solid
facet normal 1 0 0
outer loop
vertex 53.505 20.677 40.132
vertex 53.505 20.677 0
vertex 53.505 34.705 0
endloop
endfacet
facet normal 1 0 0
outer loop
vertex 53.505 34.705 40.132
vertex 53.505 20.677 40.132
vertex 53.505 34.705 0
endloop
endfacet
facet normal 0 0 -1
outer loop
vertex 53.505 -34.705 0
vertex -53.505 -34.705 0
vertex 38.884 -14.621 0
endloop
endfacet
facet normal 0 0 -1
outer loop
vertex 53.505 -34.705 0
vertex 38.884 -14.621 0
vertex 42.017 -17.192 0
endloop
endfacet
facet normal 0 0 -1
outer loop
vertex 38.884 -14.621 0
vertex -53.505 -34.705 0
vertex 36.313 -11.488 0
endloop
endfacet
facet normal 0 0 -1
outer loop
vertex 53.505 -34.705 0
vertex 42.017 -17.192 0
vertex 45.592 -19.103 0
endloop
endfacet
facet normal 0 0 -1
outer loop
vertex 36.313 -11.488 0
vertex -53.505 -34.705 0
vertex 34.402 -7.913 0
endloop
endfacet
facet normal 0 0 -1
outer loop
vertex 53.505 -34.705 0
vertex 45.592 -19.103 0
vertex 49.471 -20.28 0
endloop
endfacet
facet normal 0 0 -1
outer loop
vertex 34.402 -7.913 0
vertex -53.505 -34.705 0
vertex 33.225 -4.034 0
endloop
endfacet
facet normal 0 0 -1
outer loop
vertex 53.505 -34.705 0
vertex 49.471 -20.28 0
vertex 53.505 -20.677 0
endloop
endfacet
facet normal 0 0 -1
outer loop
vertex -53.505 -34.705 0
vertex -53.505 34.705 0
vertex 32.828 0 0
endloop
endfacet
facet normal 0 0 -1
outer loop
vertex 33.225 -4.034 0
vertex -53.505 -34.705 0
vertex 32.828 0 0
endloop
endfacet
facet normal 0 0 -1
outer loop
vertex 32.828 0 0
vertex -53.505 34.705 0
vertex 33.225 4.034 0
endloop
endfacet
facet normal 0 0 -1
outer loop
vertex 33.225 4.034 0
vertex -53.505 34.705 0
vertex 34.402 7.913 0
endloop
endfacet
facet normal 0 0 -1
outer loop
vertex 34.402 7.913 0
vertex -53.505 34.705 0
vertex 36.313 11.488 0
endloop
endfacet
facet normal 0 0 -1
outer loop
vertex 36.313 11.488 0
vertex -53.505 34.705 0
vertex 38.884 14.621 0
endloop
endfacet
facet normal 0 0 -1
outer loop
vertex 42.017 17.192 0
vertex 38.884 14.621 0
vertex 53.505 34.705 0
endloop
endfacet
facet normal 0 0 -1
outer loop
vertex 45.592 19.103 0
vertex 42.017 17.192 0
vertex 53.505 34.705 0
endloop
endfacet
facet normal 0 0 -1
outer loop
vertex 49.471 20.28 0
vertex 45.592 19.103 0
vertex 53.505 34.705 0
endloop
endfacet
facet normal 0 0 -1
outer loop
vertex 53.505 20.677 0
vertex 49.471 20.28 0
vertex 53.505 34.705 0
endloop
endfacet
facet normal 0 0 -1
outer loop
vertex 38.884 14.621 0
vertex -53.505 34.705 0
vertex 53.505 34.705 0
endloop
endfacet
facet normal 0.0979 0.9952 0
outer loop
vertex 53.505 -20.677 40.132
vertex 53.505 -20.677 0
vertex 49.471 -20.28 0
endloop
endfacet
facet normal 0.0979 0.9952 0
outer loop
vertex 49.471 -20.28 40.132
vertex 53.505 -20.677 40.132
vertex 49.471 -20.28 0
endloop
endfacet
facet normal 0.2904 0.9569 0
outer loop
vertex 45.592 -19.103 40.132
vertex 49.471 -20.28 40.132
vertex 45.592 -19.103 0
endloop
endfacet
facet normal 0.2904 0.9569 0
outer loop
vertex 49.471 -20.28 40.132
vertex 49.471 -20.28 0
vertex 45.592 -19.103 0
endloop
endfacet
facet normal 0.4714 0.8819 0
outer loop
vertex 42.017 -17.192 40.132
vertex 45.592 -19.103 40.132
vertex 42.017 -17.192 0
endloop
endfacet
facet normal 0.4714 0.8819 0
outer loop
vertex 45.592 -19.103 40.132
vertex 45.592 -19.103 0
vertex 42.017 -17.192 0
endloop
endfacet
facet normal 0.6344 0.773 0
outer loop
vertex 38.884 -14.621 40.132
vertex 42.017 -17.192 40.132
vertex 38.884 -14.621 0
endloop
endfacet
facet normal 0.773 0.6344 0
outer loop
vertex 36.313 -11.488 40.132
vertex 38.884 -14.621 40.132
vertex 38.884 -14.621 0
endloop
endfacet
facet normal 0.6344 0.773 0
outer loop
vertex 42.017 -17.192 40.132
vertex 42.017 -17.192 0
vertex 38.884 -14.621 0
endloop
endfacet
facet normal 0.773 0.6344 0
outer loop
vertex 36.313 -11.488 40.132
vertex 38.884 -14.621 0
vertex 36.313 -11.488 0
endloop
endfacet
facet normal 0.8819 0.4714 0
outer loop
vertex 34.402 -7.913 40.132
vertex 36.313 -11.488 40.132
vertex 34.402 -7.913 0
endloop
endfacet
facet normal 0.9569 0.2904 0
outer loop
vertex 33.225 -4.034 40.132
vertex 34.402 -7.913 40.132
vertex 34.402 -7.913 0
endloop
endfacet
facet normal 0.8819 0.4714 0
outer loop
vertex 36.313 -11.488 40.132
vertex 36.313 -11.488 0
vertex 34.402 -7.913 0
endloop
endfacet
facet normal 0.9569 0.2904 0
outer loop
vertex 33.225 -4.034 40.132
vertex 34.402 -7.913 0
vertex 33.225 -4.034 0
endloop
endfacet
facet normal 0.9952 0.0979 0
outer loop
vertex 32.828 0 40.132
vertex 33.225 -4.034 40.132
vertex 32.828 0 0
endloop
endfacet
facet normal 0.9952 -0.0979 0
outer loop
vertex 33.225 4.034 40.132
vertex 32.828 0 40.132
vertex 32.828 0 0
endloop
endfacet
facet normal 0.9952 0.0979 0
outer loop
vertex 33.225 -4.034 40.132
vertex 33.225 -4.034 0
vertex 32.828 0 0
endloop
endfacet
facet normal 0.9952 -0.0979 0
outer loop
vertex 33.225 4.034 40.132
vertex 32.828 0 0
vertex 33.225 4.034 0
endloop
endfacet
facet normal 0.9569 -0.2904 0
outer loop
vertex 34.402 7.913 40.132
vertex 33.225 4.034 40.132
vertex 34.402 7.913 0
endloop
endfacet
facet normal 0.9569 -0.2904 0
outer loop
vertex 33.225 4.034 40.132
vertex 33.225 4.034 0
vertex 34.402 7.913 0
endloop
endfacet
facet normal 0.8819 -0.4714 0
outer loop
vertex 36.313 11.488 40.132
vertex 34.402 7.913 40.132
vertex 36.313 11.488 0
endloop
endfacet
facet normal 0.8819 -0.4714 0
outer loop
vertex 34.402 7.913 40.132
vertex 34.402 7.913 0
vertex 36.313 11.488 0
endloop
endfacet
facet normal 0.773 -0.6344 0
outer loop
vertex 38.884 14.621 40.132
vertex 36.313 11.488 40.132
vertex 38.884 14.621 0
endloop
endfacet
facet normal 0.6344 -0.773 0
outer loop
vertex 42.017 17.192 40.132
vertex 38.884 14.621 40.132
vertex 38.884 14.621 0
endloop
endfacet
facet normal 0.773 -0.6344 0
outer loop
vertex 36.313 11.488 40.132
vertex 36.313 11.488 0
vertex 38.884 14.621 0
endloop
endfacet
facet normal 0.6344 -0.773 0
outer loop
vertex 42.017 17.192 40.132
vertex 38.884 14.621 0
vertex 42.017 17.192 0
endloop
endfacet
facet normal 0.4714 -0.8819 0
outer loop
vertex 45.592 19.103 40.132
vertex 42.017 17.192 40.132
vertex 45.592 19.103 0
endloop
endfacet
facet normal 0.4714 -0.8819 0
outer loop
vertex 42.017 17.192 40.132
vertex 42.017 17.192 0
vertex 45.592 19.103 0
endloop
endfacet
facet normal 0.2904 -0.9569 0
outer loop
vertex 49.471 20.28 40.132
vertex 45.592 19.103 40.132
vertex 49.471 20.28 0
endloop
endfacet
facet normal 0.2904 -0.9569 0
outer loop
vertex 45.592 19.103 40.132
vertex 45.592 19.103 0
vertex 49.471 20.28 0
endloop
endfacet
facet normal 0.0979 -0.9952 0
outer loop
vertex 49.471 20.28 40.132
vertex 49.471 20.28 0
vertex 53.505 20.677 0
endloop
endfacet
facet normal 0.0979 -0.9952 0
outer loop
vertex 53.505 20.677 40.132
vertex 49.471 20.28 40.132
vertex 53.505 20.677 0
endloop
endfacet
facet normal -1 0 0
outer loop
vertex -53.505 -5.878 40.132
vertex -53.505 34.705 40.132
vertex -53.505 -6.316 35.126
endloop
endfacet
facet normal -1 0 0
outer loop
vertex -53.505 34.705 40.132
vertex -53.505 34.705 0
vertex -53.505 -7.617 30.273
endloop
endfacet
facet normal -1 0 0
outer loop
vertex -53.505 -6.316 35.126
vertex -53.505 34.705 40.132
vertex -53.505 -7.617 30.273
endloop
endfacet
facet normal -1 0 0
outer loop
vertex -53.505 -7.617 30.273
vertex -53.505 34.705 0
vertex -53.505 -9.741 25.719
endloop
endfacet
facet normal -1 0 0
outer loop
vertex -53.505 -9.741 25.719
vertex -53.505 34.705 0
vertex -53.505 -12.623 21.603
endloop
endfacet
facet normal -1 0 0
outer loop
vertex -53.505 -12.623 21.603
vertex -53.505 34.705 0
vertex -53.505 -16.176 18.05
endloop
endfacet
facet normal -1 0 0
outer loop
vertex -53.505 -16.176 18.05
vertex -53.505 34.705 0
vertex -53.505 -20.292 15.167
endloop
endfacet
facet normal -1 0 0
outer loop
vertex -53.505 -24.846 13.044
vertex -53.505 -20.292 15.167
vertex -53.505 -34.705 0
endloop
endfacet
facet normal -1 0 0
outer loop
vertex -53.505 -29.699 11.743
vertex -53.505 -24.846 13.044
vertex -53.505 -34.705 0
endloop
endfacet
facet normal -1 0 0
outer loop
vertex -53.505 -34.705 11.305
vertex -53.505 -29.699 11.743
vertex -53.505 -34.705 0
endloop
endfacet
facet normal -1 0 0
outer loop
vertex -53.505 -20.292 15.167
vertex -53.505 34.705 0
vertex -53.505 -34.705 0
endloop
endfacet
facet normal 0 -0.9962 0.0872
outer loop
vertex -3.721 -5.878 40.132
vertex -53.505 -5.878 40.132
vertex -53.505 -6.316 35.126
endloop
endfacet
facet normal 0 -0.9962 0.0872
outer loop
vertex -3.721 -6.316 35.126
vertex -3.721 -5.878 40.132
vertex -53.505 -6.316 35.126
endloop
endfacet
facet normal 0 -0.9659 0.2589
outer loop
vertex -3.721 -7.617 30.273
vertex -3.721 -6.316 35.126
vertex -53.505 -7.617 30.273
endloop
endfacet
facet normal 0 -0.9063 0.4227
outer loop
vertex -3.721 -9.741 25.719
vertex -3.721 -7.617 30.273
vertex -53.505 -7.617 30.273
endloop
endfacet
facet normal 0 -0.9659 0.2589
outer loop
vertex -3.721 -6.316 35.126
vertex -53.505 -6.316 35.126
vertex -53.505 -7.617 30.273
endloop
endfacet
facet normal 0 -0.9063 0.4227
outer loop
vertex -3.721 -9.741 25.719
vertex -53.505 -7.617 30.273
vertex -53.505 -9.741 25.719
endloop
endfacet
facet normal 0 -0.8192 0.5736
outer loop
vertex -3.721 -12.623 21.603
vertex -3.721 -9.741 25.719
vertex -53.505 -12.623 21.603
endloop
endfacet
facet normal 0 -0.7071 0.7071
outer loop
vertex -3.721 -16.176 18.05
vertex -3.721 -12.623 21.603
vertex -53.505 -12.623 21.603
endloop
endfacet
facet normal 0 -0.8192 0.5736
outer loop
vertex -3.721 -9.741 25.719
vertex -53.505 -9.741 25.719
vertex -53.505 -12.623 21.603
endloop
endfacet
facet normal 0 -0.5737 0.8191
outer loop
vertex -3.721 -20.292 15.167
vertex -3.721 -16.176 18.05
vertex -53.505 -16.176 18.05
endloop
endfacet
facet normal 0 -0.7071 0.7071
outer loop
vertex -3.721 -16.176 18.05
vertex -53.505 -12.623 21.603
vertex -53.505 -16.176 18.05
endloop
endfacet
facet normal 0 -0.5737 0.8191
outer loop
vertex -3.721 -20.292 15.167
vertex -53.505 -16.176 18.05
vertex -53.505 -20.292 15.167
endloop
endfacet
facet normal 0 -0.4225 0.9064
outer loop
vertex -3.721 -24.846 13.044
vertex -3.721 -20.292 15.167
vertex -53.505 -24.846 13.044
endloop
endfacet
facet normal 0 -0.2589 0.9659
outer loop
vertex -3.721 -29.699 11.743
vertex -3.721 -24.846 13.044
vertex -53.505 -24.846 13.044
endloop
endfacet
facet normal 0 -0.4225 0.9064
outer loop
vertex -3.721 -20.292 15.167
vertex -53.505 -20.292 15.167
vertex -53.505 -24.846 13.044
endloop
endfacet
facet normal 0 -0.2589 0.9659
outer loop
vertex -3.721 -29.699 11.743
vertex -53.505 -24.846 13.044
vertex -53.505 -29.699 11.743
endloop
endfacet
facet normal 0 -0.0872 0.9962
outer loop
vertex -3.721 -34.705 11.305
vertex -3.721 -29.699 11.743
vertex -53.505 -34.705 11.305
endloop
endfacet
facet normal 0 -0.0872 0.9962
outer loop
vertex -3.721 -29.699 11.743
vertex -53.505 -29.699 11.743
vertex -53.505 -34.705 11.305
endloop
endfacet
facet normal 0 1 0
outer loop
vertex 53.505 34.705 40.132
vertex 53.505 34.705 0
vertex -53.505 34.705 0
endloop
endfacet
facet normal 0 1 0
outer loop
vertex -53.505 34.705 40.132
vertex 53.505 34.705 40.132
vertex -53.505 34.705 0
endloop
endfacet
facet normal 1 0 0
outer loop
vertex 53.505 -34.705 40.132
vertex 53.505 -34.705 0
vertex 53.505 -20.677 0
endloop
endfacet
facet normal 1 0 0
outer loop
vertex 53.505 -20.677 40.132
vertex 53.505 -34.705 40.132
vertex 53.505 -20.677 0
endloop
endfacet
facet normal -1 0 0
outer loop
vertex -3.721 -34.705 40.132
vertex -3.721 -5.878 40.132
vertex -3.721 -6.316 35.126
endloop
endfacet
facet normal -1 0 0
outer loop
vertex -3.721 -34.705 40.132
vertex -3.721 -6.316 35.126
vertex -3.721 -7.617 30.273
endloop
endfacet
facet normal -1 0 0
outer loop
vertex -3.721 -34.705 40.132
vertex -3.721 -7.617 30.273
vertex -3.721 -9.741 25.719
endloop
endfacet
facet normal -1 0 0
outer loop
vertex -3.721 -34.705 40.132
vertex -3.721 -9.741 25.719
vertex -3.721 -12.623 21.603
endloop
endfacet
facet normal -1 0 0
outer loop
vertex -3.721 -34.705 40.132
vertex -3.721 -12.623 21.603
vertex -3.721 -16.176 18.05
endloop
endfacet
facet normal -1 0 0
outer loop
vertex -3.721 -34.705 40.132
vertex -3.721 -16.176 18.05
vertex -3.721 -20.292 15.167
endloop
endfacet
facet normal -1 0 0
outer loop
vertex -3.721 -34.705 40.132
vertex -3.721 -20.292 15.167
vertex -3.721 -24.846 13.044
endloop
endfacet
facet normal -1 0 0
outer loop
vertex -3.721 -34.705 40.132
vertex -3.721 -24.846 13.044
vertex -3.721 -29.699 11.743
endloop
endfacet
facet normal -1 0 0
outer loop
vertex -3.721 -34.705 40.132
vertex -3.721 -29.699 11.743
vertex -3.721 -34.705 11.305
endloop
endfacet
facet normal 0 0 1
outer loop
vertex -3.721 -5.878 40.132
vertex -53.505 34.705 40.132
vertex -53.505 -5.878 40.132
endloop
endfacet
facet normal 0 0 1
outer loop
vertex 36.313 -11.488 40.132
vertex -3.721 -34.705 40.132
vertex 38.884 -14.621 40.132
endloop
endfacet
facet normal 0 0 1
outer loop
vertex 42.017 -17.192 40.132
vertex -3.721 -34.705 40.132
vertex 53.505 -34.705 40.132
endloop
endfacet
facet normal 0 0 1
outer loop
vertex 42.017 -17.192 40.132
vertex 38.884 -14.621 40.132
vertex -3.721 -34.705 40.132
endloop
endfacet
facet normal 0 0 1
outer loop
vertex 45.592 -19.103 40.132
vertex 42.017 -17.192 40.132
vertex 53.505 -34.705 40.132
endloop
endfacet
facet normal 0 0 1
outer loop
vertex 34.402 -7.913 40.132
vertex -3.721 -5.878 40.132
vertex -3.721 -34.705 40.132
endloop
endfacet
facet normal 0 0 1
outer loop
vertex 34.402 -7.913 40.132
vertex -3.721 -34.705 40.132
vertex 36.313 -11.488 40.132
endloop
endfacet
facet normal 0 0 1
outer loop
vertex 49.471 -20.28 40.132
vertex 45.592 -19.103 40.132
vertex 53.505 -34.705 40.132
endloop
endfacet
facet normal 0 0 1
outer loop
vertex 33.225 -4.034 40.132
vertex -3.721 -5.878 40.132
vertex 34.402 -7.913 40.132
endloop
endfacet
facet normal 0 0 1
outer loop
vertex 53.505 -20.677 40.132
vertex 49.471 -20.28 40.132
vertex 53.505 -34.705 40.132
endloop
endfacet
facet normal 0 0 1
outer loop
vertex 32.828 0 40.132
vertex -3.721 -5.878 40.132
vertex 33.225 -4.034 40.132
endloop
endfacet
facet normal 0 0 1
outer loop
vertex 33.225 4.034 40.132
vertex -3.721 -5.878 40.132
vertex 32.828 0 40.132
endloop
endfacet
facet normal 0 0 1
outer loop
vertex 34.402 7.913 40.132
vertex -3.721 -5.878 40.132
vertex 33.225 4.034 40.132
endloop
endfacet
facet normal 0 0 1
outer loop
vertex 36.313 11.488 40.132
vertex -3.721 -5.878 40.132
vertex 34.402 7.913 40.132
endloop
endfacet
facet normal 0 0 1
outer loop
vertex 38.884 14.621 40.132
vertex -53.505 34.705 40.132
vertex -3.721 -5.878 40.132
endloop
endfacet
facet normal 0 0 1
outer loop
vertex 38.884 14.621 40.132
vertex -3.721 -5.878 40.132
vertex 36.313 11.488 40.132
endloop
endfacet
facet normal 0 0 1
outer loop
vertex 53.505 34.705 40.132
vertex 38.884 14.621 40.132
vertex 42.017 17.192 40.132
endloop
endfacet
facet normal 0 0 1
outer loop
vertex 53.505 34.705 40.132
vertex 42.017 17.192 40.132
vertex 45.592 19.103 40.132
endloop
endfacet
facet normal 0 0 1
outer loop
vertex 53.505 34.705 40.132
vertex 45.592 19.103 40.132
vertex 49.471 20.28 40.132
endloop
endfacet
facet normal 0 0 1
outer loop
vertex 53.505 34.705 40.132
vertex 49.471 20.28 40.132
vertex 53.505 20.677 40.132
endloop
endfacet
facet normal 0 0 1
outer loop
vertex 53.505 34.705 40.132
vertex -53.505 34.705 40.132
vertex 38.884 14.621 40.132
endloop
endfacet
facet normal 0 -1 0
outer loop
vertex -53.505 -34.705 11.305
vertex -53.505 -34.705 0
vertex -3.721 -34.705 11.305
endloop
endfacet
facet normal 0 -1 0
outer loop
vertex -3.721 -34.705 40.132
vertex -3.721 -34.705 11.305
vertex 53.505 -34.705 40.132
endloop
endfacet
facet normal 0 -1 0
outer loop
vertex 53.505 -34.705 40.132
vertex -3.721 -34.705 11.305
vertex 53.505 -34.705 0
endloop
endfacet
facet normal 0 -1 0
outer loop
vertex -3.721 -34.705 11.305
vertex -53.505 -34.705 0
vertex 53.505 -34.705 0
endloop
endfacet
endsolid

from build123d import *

# Parameters (mm, degrees)
F1_DEPTH = 40.132
F3_DEPTH = 49.784


with BuildPart() as f1:
    # F0 (on Top) → F1 (new body)
    with BuildSketch(Plane.XY):
        with BuildLine():
            Line((-53.505063, -34.70511), (53.505063, -34.70511))
            Line((53.505063, -34.70511), (53.505063, -20.677222))
            ThreePointArc((53.505063, -20.677222), (32.827841, 0), (53.505063, 20.677222))
            Line((53.505063, 20.677222), (53.505063, 34.70511))
            Line((53.505063, 34.70511), (-53.505063, 34.70511))
            Line((-53.505063, 34.70511), (-53.505063, -34.70511))
        make_face()
    extrude(amount=F1_DEPTH)

    # F2 (on face) → F3 (cut)
    with BuildSketch(Plane(origin=(-53.505063, 0, 0), x_dir=(0, -1, 0), z_dir=(-1, 0, 0))):
        with BuildLine():
            Line((34.70511, 40.132), (5.878478, 40.132))
            ThreePointArc((5.878478, 40.132), (14.321603, 19.748493), (34.70511, 11.305368))
            Line((34.70511, 11.305368), (34.70511, 40.132))
        make_face()
        with BuildLine():
            ThreePointArc((34.70511, 11.305368), (55.088617, 19.748493), (63.531742, 40.132))
            ThreePointArc((63.531742, 40.132), (34.70511, 68.958632), (5.878478, 40.132))
            Line((5.878478, 40.132), (34.70511, 40.132))
            Line((34.70511, 40.132), (34.70511, 11.305368))
        make_face()
    extrude(amount=-F3_DEPTH, mode=Mode.SUBTRACT)


solid = f1.part
